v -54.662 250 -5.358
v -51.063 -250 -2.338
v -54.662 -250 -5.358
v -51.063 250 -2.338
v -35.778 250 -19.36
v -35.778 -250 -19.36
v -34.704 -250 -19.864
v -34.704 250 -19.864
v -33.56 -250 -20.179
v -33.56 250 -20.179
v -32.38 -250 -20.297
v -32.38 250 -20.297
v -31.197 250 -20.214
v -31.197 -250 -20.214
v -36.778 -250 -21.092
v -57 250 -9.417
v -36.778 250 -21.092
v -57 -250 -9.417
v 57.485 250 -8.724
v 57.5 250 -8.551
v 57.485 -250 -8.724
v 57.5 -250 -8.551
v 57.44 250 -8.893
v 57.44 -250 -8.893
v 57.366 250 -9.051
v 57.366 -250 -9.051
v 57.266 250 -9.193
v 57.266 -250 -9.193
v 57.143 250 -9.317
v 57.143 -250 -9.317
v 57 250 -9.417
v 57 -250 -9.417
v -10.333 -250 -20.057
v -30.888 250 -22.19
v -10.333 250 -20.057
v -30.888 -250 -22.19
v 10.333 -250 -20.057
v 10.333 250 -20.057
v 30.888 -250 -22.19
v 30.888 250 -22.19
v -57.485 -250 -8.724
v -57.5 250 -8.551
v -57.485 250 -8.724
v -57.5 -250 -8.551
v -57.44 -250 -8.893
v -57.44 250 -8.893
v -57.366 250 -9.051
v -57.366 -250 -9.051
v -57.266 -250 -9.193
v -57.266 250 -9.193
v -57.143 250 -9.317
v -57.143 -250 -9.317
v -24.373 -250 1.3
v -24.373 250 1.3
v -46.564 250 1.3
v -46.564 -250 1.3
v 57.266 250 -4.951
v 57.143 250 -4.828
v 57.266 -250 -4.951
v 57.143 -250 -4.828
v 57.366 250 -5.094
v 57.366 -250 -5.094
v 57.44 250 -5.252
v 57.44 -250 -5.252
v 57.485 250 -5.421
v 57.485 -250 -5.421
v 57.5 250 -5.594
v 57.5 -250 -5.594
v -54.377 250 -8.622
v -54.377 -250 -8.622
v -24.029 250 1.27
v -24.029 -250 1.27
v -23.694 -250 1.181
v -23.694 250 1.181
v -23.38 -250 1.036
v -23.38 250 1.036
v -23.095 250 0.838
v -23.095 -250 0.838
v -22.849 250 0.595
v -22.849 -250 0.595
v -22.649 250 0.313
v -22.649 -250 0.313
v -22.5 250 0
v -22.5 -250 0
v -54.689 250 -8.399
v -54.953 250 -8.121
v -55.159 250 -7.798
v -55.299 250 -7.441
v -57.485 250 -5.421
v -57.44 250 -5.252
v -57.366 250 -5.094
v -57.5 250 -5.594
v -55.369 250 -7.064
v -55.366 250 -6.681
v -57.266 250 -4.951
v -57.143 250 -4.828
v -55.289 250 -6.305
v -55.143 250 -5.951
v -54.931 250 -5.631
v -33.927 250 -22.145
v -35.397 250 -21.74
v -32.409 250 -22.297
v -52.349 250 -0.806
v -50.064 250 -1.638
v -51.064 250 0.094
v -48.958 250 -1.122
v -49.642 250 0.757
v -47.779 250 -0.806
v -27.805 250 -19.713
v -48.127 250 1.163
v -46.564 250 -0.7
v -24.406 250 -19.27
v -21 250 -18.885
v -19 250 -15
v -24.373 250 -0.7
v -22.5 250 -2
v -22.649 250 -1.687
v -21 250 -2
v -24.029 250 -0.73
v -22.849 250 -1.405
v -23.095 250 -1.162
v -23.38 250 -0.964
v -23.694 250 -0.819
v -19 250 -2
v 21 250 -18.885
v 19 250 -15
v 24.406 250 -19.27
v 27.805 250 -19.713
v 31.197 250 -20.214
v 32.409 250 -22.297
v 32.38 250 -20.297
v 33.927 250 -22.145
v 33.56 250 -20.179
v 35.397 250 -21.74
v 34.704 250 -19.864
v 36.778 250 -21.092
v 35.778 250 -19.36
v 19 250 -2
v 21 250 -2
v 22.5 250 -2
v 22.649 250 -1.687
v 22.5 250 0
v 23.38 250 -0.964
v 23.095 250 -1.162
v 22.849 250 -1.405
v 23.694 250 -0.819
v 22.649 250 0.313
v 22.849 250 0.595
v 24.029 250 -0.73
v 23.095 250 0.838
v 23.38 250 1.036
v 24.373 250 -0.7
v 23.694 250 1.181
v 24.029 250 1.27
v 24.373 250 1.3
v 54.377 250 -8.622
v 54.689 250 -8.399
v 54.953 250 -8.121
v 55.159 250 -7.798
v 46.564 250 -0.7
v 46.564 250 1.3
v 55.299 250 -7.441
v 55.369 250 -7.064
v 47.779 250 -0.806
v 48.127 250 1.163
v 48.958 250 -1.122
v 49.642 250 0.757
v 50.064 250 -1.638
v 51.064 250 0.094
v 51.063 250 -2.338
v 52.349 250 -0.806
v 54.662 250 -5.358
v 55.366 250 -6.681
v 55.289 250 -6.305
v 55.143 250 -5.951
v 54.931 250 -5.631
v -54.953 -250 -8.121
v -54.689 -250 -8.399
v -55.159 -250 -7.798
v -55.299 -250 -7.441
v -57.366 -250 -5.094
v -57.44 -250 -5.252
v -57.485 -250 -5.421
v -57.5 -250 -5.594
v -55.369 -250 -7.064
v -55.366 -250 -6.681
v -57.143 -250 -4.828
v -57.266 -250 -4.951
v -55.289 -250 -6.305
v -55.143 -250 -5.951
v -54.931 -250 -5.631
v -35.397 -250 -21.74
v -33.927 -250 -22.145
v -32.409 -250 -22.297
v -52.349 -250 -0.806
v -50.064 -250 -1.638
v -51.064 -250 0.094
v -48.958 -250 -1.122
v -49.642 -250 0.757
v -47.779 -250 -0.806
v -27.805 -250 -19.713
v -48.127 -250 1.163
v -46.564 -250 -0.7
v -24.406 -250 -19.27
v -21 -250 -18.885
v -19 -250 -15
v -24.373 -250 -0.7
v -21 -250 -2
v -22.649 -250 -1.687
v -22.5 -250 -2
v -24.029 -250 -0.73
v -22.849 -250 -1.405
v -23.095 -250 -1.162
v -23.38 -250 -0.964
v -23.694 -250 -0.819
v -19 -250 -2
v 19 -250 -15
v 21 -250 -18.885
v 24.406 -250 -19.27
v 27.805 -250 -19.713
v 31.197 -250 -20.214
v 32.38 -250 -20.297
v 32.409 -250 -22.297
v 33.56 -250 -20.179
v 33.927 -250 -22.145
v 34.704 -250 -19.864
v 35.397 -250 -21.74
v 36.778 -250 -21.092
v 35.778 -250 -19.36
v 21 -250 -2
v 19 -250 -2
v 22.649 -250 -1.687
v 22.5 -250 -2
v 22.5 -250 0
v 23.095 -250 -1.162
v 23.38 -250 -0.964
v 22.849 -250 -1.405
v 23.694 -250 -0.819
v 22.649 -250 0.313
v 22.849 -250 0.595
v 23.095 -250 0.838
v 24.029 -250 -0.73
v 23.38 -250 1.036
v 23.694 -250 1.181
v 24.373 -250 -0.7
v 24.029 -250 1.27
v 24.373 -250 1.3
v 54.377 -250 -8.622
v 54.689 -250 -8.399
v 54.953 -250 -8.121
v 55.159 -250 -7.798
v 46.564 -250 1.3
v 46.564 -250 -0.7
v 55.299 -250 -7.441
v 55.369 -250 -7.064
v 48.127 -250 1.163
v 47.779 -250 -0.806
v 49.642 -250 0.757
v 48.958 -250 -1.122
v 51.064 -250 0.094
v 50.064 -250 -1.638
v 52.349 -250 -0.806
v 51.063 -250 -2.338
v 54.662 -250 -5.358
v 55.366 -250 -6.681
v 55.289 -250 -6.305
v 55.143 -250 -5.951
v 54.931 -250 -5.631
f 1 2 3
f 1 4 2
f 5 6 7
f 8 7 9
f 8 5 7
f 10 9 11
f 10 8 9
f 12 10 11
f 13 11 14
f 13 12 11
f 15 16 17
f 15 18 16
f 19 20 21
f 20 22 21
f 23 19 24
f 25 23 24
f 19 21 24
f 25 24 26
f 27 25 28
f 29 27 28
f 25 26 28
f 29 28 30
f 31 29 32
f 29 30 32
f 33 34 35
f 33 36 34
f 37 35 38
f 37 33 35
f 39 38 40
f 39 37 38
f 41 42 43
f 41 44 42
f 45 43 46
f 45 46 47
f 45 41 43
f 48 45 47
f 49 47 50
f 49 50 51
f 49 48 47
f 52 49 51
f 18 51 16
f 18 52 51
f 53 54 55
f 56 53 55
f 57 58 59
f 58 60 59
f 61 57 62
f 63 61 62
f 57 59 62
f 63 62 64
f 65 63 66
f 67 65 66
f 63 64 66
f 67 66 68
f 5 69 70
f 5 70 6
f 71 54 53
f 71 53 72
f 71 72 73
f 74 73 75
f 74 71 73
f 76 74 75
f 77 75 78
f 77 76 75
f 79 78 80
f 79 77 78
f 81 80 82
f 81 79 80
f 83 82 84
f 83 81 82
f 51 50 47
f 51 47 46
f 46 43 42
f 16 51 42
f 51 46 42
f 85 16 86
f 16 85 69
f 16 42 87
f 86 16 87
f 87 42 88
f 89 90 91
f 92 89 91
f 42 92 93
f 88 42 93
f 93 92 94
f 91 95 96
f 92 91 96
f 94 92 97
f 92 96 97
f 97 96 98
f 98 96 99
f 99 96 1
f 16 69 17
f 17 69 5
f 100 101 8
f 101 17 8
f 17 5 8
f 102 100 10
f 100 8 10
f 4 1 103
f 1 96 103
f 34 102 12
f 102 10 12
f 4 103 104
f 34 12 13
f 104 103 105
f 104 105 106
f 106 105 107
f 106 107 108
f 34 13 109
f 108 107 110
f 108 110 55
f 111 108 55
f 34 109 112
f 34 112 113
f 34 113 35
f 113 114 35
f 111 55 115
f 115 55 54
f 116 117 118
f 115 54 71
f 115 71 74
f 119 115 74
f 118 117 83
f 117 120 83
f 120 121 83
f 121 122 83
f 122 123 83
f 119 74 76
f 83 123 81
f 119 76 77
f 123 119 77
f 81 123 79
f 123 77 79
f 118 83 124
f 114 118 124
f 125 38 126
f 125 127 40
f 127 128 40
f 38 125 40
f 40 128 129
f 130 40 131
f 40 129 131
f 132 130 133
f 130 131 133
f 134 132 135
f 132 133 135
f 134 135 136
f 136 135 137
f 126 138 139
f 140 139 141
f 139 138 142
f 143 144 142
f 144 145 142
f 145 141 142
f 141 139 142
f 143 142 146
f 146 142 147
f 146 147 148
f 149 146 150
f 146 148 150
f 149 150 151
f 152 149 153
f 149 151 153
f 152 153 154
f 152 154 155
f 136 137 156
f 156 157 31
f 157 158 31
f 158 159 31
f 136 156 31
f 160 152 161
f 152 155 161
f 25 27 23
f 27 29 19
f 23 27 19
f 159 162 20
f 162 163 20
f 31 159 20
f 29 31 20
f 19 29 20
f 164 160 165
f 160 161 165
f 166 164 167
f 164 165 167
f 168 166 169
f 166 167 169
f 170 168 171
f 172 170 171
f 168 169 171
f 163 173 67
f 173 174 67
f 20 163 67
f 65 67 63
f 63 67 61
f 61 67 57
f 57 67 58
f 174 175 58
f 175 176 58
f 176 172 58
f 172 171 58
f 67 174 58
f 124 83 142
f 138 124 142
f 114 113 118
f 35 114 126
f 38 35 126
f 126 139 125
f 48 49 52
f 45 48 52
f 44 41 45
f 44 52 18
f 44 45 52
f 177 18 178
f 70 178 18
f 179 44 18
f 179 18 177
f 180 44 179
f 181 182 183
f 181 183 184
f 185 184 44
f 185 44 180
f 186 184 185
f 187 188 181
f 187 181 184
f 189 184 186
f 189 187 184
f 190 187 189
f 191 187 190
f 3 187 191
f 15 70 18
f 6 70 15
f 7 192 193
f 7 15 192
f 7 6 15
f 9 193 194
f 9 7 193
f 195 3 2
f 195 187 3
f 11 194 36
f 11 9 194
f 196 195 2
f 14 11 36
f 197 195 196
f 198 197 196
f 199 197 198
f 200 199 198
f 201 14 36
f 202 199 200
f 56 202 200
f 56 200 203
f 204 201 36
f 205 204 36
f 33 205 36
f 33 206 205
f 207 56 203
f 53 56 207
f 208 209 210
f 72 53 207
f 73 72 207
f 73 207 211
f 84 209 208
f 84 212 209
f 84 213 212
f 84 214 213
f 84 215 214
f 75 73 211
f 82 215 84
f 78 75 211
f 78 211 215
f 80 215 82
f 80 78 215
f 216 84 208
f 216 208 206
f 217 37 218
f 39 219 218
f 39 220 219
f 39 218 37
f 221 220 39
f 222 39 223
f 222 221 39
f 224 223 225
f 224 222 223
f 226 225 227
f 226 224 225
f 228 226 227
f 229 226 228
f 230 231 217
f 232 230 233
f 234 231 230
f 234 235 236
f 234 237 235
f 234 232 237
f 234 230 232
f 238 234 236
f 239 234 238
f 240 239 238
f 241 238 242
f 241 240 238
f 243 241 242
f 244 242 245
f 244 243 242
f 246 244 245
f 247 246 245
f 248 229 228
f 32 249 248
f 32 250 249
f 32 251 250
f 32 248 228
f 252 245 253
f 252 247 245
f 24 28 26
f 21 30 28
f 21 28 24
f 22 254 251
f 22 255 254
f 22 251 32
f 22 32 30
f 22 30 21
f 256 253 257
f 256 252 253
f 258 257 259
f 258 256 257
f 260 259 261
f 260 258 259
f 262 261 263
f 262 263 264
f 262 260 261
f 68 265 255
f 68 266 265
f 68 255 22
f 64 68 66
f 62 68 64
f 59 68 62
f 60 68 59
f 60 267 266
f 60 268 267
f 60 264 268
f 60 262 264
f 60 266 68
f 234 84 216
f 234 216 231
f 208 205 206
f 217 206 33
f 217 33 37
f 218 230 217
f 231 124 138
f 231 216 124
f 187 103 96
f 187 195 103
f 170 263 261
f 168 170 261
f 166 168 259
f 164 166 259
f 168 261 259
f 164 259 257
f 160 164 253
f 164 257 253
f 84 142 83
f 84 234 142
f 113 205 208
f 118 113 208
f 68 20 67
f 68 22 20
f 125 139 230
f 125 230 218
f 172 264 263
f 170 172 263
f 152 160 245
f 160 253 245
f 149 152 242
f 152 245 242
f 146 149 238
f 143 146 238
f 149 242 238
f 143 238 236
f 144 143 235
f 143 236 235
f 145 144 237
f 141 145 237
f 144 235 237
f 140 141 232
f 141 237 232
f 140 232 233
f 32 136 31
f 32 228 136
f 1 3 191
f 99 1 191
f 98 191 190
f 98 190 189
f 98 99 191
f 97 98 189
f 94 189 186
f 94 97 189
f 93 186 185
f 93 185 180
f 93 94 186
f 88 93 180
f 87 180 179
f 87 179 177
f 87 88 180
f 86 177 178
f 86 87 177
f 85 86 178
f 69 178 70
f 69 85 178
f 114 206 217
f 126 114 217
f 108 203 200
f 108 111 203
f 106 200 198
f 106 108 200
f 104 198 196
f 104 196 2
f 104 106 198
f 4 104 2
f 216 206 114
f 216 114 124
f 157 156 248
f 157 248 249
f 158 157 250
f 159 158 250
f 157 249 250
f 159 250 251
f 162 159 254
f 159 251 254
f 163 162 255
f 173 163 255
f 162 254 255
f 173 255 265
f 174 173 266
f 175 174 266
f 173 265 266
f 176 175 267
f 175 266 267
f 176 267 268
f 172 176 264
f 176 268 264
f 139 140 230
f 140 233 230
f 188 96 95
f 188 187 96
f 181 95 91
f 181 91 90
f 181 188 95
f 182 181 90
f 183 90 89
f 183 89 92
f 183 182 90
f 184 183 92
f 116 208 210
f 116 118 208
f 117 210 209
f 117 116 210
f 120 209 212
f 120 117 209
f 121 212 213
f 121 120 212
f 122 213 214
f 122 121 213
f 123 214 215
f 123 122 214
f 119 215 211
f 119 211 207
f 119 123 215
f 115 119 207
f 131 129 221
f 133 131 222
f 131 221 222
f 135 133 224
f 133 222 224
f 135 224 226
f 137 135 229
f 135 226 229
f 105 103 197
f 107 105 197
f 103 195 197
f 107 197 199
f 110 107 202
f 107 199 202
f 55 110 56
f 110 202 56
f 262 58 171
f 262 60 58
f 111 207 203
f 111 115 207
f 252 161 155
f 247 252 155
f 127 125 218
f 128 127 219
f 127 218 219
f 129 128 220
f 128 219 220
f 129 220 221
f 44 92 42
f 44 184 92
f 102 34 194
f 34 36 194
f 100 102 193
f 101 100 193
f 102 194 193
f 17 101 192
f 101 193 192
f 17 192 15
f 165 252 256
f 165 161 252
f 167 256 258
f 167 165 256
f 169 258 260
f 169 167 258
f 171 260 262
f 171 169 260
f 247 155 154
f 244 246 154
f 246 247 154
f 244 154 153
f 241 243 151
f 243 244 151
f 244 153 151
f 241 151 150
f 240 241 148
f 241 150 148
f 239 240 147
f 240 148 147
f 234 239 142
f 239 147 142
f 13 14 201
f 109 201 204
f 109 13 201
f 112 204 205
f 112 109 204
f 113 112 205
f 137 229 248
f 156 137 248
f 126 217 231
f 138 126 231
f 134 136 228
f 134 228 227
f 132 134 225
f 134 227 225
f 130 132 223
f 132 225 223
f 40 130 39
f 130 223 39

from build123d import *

# Parameters (mm, degrees)
F1_DEPTH    = 250
F2_W        = 38
F2_H        = 13
F3_DEPTH    = 250
F4_T1_DEPTH = 509.3674969976
F5_R        = 9
F6_R        = 1
F8_DEPTH    = 250


# Not quite as in the source:
# - a fillet or chamfer that OpenCascade refuses, or shapes differently, is made with other operations: its cross-section is extruded or revolved along the edge and cut away or added


with BuildPart() as f1:
    # F0 (on Front) → F1 (new body, symmetric)
    with BuildSketch(Plane.XZ):
        with BuildLine():
            Line((22.5, 0), (0, 0))
            Line((0, 0), (-22.5, 0))
            Line((-22.5, 0), (-22.5, 1.3))
            Line((-22.5, 1.3), (-49.8395555688, 1.3))
            Line((-49.8395555688, 1.3), (-57.5, -5.1278760969))
            Line((-57.5, -5.1278760969), (-57.5, -9.1278760969))
            Line((-57.5, -9.1278760969), (-33.9923918332, -22.7))
            ThreePointArc((-33.9923918332, -22.7), (0, -19.7901248096), (33.9923918332, -22.7))
            Line((33.9923918332, -22.7), (57.5, -9.1278760969))
            Line((57.5, -9.1278760969), (57.5, -5.1278760969))
            Line((57.5, -5.1278760969), (49.8395555688, 1.3))
            Line((49.8395555688, 1.3), (22.5, 1.3))
            Line((22.5, 1.3), (22.5, 0))
        make_face()
    extrude(amount=F1_DEPTH, both=True)

    # F2 (on Front) → F3 (cut, symmetric)
    with BuildSketch(Plane.XZ):
        with Locations((0, -8.5)):
            Rectangle(F2_W, F2_H)
    extrude(amount=F3_DEPTH, both=True, mode=Mode.SUBTRACT)

    # F4: fillet of radius 2 on 2 edges, made by hand

    # F4_s2 → F4_t1 (cut)
    with BuildSketch(Plane.XZ.offset(-254.6837484988)):
        with BuildLine():
            ThreePointArc((-24.3734993995, 1.3), (-23.2333239744, 0.9431676725), (-22.5, 0))
            Line((-22.5, 0), (-22.5, 1.3))
            Line((-22.5, 1.3), (-24.3734993995, 1.3))
        make_face()
        with BuildLine():
            ThreePointArc((24.3734993995, 1.3), (23.2333239744, 0.9431676725), (22.5, 0))
            Line((22.5, 0), (22.5, 1.3))
            Line((22.5, 1.3), (24.3734993995, 1.3))
        make_face()
    extrude(amount=F4_T1_DEPTH, mode=Mode.SUBTRACT)

    # F5
    f5_edges = [f1.edges().sort_by_distance(p)[0] for p in [
        (-49.839556, 0, 1.3),
        (49.839556, 0, 1.3),
        (33.992392, 0, -22.7),
        (-33.992392, 0, -22.7),
    ]]
    fillet(f5_edges, radius=F5_R)

    # F6
    f6_edges = [f1.edges().sort_by_distance(p)[0] for p in [
        (-57.5, 0, -5.127876),
        (57.5, 0, -5.127876),
        (57.5, 0, -9.127876),
        (-57.5, 0, -9.127876),
    ]]
    fillet(f6_edges, radius=F6_R)

    # F7 (on Front) → F8 (cut, symmetric)
    with BuildSketch(Plane.XZ):
        with BuildLine():
            ThreePointArc((-35.7777574473, -19.3598176053), (-33.5603570371, -20.1791322254), (-31.1966842313, -20.2136560239))
            ThreePointArc((-31.1966842313, -20.2136560239), (-26.106800057, -19.4842711987), (-21, -18.8846744107))
            Line((-21, -18.8846744107), (-21, -2))
            Line((-21, -2), (-22.5, -2))
            ThreePointArc((-22.5, -2), (-23.2333239744, -1.0568323275), (-24.3734993995, -0.7))
            Line((-24.3734993995, -0.7), (-46.5638234604, -0.7))
            ThreePointArc((-46.5638234604, -0.7), (-48.9579644637, -1.1221516545), (-51.0633367282, -2.3376888982))
            Line((-51.0633367282, -2.3376888982), (-54.6622869129, -5.3575666708))
            ThreePointArc((-54.6622869129, -5.3575666708), (-55.3691010897, -7.0639670425), (-54.3767116936, -8.6217063646))
            Line((-54.3767116936, -8.6217063646), (-35.7777574473, -19.3598176053))
        make_face()
        with BuildLine():
            Line((22.5, -2), (21, -2))
            Line((21, -2), (21, -18.8846744107))
            ThreePointArc((21, -18.8846744107), (26.106800057, -19.4842711987), (31.1966842313, -20.2136560239))
            ThreePointArc((31.1966842313, -20.2136560239), (33.5603570371, -20.1791322254), (35.7777574473, -19.3598176053))
            Line((35.7777574473, -19.3598176053), (54.3767116936, -8.6217063646))
            ThreePointArc((54.3767116936, -8.6217063646), (55.3691010897, -7.0639670425), (54.6622869129, -5.3575666708))
            Line((54.6622869129, -5.3575666708), (51.0633367282, -2.3376888982))
            ThreePointArc((51.0633367282, -2.3376888982), (48.9579644637, -1.1221516545), (46.5638234604, -0.7))
            Line((46.5638234604, -0.7), (24.3734993995, -0.7))
            ThreePointArc((24.3734993995, -0.7), (23.2333239744, -1.0568323275), (22.5, -2))
        make_face()
    extrude(amount=F8_DEPTH, both=True, mode=Mode.SUBTRACT)


solid = f1.part
